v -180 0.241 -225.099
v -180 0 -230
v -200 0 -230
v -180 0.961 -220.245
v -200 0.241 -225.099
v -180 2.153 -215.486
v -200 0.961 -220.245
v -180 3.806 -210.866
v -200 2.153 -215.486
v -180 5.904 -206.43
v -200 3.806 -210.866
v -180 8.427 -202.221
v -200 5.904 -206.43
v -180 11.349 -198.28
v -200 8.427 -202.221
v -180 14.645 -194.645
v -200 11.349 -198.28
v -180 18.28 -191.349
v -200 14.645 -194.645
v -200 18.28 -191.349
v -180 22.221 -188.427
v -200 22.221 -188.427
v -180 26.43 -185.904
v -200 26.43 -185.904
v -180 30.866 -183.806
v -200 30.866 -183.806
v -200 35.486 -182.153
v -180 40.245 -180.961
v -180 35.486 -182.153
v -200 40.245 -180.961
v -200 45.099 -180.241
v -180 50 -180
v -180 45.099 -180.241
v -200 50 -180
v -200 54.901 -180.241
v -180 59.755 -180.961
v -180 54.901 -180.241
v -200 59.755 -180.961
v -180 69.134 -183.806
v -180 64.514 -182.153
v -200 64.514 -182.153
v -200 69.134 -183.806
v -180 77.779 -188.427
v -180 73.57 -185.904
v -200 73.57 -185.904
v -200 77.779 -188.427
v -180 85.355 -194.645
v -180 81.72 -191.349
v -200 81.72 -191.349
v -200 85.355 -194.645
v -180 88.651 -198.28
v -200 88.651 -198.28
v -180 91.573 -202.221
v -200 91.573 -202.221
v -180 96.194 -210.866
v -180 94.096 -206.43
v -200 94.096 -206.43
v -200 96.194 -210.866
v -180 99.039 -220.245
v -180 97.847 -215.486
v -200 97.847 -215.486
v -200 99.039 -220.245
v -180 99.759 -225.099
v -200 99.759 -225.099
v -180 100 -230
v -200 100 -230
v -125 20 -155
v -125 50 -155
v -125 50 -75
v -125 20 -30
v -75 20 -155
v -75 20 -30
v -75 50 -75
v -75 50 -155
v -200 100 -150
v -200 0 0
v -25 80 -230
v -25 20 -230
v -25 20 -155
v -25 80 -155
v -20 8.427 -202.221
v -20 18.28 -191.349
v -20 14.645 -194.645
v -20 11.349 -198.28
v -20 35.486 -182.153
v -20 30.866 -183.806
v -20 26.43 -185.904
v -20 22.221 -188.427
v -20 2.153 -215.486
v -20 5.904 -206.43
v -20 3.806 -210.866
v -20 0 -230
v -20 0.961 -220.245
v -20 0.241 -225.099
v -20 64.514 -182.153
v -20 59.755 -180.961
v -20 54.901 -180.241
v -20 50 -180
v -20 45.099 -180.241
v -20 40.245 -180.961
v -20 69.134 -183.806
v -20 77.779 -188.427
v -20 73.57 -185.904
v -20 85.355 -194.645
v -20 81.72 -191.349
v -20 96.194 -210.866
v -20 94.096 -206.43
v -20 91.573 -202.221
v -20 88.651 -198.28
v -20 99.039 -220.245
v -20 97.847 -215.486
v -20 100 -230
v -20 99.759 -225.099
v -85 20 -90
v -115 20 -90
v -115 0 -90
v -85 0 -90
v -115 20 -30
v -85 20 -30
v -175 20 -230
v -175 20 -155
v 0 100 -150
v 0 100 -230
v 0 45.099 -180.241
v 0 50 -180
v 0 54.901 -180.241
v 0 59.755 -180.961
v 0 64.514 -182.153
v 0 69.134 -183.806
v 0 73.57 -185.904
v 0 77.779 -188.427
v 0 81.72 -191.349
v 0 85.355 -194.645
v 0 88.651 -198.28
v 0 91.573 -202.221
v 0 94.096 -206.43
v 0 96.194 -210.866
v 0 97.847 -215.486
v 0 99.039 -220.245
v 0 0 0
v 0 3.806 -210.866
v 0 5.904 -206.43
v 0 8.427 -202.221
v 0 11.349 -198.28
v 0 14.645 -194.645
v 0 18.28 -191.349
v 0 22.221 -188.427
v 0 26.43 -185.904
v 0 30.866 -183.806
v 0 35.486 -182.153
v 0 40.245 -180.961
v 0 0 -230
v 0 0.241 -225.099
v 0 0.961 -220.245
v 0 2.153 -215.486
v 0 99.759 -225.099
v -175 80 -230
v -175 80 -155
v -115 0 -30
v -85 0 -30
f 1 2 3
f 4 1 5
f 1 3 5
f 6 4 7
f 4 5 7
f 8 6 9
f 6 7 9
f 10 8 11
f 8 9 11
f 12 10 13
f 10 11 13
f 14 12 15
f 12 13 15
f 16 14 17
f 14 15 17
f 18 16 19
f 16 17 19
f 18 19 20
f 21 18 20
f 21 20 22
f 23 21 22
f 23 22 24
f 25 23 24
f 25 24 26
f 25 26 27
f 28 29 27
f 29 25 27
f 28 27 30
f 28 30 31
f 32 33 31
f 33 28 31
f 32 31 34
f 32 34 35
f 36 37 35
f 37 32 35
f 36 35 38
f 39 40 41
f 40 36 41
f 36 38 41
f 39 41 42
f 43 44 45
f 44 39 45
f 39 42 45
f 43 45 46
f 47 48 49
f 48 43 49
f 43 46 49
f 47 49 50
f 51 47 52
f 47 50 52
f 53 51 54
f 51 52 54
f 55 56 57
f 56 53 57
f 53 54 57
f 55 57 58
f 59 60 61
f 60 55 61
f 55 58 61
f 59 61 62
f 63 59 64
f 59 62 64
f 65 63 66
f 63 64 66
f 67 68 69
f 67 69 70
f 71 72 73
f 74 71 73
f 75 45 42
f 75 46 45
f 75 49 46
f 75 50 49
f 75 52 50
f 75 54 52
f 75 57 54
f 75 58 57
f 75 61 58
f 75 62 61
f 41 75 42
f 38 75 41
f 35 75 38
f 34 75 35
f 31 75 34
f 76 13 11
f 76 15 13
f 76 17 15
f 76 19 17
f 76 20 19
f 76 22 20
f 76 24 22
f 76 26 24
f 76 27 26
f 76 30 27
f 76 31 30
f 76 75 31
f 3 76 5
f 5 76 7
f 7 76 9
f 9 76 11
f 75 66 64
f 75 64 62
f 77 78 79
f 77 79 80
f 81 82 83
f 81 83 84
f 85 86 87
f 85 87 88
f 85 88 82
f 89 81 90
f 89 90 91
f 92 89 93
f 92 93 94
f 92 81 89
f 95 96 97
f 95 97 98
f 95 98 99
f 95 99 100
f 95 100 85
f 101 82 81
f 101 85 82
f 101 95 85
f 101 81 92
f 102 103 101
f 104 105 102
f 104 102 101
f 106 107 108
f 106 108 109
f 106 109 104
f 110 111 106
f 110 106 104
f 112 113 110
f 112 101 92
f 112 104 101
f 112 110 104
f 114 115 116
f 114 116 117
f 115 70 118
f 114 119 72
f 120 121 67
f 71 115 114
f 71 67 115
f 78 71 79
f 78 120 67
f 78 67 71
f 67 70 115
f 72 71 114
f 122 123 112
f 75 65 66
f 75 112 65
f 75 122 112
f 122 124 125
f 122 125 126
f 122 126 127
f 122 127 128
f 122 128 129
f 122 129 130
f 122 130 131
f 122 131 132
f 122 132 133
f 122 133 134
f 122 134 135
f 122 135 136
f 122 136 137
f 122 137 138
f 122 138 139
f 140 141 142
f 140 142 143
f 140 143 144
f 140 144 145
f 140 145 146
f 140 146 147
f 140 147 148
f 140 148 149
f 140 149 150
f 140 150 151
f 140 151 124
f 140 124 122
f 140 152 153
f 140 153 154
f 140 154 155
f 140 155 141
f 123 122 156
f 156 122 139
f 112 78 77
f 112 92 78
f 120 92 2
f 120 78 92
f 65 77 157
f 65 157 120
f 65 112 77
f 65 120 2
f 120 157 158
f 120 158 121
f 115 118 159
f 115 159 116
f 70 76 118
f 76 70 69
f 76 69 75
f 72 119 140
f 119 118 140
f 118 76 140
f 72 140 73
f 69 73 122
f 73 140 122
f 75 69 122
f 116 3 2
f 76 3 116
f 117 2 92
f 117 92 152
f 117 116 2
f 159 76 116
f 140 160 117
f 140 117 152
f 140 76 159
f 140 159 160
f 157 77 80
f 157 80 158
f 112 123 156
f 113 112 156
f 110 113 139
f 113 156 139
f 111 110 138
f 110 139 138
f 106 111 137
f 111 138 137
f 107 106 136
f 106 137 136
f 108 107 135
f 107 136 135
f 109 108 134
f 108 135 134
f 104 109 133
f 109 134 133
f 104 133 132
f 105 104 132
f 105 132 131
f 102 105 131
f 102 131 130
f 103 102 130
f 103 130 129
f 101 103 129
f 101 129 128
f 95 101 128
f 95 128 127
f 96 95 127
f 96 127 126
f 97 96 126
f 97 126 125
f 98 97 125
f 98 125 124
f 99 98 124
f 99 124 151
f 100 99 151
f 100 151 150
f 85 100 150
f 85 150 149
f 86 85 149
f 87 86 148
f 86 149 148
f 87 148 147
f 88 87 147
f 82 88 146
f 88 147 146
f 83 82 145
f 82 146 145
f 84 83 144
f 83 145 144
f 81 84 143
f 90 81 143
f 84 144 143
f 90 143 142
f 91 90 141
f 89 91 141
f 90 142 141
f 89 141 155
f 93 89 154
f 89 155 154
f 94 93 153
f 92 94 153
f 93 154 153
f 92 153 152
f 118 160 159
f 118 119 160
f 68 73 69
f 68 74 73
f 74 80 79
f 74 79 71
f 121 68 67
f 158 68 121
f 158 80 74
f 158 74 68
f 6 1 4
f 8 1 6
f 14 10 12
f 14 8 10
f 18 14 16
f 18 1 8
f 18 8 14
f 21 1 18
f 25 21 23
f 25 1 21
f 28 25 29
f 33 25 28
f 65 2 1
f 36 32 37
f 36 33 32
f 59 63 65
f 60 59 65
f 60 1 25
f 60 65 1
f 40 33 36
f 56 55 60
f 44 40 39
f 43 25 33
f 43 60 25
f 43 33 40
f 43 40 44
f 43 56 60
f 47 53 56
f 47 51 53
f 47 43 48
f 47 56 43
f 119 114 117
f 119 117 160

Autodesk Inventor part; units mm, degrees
ref_plane "YZ Plane" through (0, 0, 0) normal (1, 0, 0) x (0, 1, 0)
ref_plane "XZ Plane" through (0, 0, 0) normal (0, 1, 0) x (-1, 0, 0)
ref_plane "XY Plane" through (0, 0, 0) normal (0, 0, 1) x (1, 0, 0)
sketch "Sketch1" plane through (0, 0, 0) normal (0, 1, 0) x (-1, 0, 0)
  line L0 (0, 0) -> (200, 0)
  line L1 (200, 0) -> (200, -150)
  line L2 (200, -150) -> (0, -150)
  line L3 (0, -150) -> (0, 0)
  dimension "d0" = 150
  dimension "d1" = 200
extrude "Extrusion1" add sketch "Sketch1" along normal blind 100
sketch "Sketch4" plane through (0, 0, 0) normal (1, 0, 0) x (0, 0, -1)
  line L0 (0, 100) -> (0, 0)
  line L1 (0, 100) -> (150, 100) projected
  line L2 (0, 0) -> (150, 100)
  line L3 (150, 100) -> (0, 100)
extrude "Extrusion3" cut sketch "Sketch4" against normal blind 200
sketch "Sketch5" plane through (0, 0, -150) normal (0, 0, -1) x (-1, 0, 0)
  line L0 (0, 0) -> (0, 100) projected
  line L1 (200, 0) -> (0, 0) projected
  line L2 (0, 100) -> (200, 100)
  line L3 (200, 100) -> (200, 0)
  line L4 (200, 0) -> (0, 0)
  line L5 (0, 0) -> (0, 100)
extrude "Extrusion4" add sketch "Sketch5" along normal blind 80
sketch "Sketch6" plane through (0, 0, -230) normal (0, 0, -1) x (-1, 0, 0)
  line L0 (25, 80) -> (175, 80)
  line L1 (175, 80) -> (175, 20)
  line L2 (175, 20) -> (25, 20)
  line L3 (25, 20) -> (25, 80)
  line L4 (0, 0) -> (200, 0) projected
  line L5 (200, 100) -> (0, 100) projected
  line L6 (200, 0) -> (200, 100) projected
  line L7 (0, 100) -> (0, 0) projected
  dimension "d11" = 150
  dimension "d12" = 60
  dimension "d13" = 20
  dimension "d14" = 25
extrude "Extrusion5" cut sketch "Sketch6" against normal blind 75 contours L0 L1 L2 L3
sketch "Sketch7" plane through (0, 0, -155) normal (0, 0, -1) x (-1, 0, 0)
  line L0 (25, 20) -> (25, 80) projected
  line L1 (175, 80) -> (175, 20) projected
  line L2 (25, 20) -> (25, 80) projected
  line L3 (25, 80) -> (175, 80) projected
  line L4 (175, 80) -> (175, 20) projected
  line L5 (175, 20) -> (25, 20) projected
  line L6 (200, 0) -> (200, 100) projected
  line L7 (200, 100) -> (0, 100) projected
  line L8 (0, 100) -> (0, 0) projected
  line L9 (0, 0) -> (200, 0) projected
  line L10 (175, 20) -> (25, 20) projected
  line L11 (25, 80) -> (175, 80) projected
  line L12 (25, 20) -> (25, 80) projected
  line L13 (175, 20) -> (25, 20) projected
  line L14 (175, 80) -> (175, 20) projected
  line L15 (75, 50) -> (125, 50)
  line L16 (125, 50) -> (125, 20)
  line L17 (125, 20) -> (75, 20)
  line L18 (75, 20) -> (75, 50)
  point P0 (0, 0)
  dimension "d17" = 50
  dimension "d18" = 30
  dimension "d20" = 0
  dimension "d21" = 50
extrude "Extrusion6" cut sketch "Sketch7" against normal up to next contours L18 L15 L16 L5
sketch "Sketch8" plane through (-175, 20, -230) normal (0, 1, 0) x (1, 0, 0)
  line L0 (100, -200) -> (50, -200) projected
  line L1 (100, -155) -> (100, -200) projected
  line L2 (50, -200) -> (50, -155) projected
  line L3 (50, -155) -> (100, -155) projected
  line L4 (100, -155) -> (100, -200) projected
  line L5 (100, -200) -> (50, -200) projected
  line L6 (50, -200) -> (50, -155) projected
  line L7 (50, -155) -> (100, -155) projected
  line L8 (175, -80) -> (175, -230) projected
  line L9 (175, -80) -> (-25, -80) projected
  line L10 (-25, -230) -> (-25, -80) projected
  line L11 (175, -230) -> (-25, -230) projected
  line L12 (90, -200) -> (60, -200)
  line L13 (60, -200) -> (60, -140)
  line L14 (60, -140) -> (90, -140)
  line L15 (90, -140) -> (90, -200)
  dimension "d24" = 30
  dimension "d25" = 60
  dimension "d26" = 0
  dimension "d27" = 10
extrude "Extrusion7" cut sketch "Sketch8" against normal up to next contours L0 L13 L3 L15 | L3 L13 L14 L15
sketch "Sketch9" plane through (0, 0, -230) normal (1, 0, 0) x (0, 0, -1)
  line L0 (0, 100) -> (0, 0) projected
  circle A0 centre (0, 50) radius 50
  point P0 (-230, 0)
  dimension "d30" = 100
extrude "Extrusion8" cut sketch "Sketch9" against normal blind 20
sketch "Sketch10" plane through (-200, 0, -230) normal (-1, 0, 0) x (0, 0, 1)
  circle A0 centre (0, 50) radius 50
  line L0 (0, 0) -> (0, 100) projected
  line L1 (230, 0) -> (0, 0) projected
  dimension "d33" = 100
extrude "Extrusion9" cut sketch "Sketch10" against normal blind 20
sketch "Sketch12" plane through (-180, 0, -230) normal (-1, 0, 0) x (0, 0, 1)
  point P0 (230, 0)
properties part number "Sumobot v1.0"
